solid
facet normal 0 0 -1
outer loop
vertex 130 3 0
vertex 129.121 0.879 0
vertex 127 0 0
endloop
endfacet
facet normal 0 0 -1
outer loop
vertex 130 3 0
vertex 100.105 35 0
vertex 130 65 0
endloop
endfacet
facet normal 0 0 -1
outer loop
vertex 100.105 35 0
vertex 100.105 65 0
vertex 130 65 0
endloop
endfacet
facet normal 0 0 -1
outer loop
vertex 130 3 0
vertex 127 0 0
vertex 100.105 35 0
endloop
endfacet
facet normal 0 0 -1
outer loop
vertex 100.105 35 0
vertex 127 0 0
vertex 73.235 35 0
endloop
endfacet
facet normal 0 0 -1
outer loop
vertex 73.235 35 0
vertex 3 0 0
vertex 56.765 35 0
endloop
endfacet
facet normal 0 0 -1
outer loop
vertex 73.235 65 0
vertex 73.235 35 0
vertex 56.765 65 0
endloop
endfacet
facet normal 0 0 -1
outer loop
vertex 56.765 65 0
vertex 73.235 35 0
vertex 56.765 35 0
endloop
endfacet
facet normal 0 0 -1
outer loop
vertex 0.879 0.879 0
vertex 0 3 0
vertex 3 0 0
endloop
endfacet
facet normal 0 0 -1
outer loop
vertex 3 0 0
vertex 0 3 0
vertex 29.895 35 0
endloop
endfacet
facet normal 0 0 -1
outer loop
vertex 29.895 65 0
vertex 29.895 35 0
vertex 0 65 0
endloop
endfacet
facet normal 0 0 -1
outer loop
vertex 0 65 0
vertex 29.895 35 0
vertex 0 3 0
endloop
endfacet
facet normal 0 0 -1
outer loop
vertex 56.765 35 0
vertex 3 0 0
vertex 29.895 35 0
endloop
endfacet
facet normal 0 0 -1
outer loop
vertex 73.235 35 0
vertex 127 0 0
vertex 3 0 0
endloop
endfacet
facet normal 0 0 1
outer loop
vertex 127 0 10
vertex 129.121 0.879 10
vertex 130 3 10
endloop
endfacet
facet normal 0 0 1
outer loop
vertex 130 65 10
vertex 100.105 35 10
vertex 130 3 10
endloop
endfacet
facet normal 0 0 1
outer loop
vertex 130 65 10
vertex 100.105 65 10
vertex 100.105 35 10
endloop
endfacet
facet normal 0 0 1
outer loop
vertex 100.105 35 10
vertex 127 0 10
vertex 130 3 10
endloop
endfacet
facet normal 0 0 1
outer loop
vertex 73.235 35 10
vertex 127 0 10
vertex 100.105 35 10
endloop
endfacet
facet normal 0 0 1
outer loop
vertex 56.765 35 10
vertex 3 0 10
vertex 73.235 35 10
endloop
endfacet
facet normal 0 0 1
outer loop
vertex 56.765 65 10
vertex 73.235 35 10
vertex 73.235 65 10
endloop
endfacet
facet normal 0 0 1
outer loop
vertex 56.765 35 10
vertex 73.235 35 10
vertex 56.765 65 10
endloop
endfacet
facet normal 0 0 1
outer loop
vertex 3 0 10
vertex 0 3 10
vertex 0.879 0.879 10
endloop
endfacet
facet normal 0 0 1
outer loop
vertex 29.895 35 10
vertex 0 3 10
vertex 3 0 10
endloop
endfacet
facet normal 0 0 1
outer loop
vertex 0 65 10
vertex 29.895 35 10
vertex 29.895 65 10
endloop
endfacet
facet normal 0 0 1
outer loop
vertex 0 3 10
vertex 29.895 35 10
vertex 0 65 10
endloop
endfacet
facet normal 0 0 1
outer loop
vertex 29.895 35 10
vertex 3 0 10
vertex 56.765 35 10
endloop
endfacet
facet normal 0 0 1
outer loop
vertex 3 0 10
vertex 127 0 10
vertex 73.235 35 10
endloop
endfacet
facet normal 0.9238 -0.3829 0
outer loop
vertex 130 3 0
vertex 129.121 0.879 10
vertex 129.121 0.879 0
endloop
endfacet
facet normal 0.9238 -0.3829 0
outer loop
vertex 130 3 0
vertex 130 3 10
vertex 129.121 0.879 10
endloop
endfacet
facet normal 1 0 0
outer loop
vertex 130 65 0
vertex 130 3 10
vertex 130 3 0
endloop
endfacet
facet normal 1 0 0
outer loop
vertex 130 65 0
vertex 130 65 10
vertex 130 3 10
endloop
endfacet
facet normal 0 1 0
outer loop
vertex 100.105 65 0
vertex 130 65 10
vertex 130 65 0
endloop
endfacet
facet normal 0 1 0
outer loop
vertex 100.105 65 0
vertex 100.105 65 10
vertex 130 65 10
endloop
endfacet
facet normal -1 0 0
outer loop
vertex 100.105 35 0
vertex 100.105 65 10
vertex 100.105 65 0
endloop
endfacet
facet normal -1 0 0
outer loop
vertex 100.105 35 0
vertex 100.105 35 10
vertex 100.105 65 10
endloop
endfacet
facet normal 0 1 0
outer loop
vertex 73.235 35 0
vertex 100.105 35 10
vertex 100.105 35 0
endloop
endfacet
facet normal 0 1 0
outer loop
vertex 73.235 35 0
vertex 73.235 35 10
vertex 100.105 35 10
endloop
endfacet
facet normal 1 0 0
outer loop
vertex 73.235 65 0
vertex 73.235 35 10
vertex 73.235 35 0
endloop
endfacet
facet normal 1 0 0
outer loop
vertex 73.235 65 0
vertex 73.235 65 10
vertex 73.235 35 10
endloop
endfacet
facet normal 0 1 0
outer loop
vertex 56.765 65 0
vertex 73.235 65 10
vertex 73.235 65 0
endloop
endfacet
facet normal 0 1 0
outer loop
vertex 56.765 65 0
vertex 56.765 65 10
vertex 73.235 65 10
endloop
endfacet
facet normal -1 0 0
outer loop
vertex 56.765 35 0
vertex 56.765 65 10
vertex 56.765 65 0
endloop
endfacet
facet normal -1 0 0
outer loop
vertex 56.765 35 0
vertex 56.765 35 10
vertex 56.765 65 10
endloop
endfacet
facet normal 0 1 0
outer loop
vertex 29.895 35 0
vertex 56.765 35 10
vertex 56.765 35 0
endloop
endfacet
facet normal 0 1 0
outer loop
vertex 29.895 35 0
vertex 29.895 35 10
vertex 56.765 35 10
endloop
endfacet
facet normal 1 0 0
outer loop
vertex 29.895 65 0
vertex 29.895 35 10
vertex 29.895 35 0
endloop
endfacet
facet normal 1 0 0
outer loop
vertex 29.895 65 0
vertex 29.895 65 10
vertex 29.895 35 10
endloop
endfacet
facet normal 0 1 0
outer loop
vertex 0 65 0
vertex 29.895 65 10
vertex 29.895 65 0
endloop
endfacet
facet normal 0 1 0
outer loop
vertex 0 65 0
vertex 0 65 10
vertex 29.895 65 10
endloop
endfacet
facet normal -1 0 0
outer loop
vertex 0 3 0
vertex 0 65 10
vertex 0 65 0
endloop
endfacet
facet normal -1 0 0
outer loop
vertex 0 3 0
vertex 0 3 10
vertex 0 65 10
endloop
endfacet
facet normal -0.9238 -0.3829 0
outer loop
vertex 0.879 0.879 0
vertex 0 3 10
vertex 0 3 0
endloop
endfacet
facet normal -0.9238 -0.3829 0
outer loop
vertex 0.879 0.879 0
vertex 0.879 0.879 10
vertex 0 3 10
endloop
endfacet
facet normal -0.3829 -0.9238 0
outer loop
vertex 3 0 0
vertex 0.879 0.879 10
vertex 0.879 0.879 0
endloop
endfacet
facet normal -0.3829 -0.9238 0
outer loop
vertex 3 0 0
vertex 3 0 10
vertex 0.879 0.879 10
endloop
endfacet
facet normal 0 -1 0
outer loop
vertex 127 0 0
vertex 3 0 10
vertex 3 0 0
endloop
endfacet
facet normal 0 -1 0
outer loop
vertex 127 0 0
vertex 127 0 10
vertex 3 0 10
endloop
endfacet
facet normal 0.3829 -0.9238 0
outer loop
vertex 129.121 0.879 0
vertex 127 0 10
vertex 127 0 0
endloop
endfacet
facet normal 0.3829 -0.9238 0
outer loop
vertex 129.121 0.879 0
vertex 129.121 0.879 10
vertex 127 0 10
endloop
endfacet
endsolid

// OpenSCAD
$fn = 32;

// ----------------------------------------------------------------------
// Window plate: 130 x 65 mm, 2 open windows
// ----------------------------------------------------------------------

// --- parameters (mm) ---
profile_height = 10;      // extrusion height
profile_points = 16;      // points of the closed outline

profile = [[0, 3], [0.879, 0.879], [3, 0], [127, 0], [129.121, 0.879], [130, 3], [130, 65], [100.105, 65], [100.105, 35], [73.235, 35], [73.235, 65], [56.765, 65], [56.765, 35], [29.895, 35], [29.895, 65], [0, 65]];  // single closed polygon, 16 points, counter clockwise

// --- the one profile operation ---
linear_extrude(height = profile_height) polygon(points = profile);
